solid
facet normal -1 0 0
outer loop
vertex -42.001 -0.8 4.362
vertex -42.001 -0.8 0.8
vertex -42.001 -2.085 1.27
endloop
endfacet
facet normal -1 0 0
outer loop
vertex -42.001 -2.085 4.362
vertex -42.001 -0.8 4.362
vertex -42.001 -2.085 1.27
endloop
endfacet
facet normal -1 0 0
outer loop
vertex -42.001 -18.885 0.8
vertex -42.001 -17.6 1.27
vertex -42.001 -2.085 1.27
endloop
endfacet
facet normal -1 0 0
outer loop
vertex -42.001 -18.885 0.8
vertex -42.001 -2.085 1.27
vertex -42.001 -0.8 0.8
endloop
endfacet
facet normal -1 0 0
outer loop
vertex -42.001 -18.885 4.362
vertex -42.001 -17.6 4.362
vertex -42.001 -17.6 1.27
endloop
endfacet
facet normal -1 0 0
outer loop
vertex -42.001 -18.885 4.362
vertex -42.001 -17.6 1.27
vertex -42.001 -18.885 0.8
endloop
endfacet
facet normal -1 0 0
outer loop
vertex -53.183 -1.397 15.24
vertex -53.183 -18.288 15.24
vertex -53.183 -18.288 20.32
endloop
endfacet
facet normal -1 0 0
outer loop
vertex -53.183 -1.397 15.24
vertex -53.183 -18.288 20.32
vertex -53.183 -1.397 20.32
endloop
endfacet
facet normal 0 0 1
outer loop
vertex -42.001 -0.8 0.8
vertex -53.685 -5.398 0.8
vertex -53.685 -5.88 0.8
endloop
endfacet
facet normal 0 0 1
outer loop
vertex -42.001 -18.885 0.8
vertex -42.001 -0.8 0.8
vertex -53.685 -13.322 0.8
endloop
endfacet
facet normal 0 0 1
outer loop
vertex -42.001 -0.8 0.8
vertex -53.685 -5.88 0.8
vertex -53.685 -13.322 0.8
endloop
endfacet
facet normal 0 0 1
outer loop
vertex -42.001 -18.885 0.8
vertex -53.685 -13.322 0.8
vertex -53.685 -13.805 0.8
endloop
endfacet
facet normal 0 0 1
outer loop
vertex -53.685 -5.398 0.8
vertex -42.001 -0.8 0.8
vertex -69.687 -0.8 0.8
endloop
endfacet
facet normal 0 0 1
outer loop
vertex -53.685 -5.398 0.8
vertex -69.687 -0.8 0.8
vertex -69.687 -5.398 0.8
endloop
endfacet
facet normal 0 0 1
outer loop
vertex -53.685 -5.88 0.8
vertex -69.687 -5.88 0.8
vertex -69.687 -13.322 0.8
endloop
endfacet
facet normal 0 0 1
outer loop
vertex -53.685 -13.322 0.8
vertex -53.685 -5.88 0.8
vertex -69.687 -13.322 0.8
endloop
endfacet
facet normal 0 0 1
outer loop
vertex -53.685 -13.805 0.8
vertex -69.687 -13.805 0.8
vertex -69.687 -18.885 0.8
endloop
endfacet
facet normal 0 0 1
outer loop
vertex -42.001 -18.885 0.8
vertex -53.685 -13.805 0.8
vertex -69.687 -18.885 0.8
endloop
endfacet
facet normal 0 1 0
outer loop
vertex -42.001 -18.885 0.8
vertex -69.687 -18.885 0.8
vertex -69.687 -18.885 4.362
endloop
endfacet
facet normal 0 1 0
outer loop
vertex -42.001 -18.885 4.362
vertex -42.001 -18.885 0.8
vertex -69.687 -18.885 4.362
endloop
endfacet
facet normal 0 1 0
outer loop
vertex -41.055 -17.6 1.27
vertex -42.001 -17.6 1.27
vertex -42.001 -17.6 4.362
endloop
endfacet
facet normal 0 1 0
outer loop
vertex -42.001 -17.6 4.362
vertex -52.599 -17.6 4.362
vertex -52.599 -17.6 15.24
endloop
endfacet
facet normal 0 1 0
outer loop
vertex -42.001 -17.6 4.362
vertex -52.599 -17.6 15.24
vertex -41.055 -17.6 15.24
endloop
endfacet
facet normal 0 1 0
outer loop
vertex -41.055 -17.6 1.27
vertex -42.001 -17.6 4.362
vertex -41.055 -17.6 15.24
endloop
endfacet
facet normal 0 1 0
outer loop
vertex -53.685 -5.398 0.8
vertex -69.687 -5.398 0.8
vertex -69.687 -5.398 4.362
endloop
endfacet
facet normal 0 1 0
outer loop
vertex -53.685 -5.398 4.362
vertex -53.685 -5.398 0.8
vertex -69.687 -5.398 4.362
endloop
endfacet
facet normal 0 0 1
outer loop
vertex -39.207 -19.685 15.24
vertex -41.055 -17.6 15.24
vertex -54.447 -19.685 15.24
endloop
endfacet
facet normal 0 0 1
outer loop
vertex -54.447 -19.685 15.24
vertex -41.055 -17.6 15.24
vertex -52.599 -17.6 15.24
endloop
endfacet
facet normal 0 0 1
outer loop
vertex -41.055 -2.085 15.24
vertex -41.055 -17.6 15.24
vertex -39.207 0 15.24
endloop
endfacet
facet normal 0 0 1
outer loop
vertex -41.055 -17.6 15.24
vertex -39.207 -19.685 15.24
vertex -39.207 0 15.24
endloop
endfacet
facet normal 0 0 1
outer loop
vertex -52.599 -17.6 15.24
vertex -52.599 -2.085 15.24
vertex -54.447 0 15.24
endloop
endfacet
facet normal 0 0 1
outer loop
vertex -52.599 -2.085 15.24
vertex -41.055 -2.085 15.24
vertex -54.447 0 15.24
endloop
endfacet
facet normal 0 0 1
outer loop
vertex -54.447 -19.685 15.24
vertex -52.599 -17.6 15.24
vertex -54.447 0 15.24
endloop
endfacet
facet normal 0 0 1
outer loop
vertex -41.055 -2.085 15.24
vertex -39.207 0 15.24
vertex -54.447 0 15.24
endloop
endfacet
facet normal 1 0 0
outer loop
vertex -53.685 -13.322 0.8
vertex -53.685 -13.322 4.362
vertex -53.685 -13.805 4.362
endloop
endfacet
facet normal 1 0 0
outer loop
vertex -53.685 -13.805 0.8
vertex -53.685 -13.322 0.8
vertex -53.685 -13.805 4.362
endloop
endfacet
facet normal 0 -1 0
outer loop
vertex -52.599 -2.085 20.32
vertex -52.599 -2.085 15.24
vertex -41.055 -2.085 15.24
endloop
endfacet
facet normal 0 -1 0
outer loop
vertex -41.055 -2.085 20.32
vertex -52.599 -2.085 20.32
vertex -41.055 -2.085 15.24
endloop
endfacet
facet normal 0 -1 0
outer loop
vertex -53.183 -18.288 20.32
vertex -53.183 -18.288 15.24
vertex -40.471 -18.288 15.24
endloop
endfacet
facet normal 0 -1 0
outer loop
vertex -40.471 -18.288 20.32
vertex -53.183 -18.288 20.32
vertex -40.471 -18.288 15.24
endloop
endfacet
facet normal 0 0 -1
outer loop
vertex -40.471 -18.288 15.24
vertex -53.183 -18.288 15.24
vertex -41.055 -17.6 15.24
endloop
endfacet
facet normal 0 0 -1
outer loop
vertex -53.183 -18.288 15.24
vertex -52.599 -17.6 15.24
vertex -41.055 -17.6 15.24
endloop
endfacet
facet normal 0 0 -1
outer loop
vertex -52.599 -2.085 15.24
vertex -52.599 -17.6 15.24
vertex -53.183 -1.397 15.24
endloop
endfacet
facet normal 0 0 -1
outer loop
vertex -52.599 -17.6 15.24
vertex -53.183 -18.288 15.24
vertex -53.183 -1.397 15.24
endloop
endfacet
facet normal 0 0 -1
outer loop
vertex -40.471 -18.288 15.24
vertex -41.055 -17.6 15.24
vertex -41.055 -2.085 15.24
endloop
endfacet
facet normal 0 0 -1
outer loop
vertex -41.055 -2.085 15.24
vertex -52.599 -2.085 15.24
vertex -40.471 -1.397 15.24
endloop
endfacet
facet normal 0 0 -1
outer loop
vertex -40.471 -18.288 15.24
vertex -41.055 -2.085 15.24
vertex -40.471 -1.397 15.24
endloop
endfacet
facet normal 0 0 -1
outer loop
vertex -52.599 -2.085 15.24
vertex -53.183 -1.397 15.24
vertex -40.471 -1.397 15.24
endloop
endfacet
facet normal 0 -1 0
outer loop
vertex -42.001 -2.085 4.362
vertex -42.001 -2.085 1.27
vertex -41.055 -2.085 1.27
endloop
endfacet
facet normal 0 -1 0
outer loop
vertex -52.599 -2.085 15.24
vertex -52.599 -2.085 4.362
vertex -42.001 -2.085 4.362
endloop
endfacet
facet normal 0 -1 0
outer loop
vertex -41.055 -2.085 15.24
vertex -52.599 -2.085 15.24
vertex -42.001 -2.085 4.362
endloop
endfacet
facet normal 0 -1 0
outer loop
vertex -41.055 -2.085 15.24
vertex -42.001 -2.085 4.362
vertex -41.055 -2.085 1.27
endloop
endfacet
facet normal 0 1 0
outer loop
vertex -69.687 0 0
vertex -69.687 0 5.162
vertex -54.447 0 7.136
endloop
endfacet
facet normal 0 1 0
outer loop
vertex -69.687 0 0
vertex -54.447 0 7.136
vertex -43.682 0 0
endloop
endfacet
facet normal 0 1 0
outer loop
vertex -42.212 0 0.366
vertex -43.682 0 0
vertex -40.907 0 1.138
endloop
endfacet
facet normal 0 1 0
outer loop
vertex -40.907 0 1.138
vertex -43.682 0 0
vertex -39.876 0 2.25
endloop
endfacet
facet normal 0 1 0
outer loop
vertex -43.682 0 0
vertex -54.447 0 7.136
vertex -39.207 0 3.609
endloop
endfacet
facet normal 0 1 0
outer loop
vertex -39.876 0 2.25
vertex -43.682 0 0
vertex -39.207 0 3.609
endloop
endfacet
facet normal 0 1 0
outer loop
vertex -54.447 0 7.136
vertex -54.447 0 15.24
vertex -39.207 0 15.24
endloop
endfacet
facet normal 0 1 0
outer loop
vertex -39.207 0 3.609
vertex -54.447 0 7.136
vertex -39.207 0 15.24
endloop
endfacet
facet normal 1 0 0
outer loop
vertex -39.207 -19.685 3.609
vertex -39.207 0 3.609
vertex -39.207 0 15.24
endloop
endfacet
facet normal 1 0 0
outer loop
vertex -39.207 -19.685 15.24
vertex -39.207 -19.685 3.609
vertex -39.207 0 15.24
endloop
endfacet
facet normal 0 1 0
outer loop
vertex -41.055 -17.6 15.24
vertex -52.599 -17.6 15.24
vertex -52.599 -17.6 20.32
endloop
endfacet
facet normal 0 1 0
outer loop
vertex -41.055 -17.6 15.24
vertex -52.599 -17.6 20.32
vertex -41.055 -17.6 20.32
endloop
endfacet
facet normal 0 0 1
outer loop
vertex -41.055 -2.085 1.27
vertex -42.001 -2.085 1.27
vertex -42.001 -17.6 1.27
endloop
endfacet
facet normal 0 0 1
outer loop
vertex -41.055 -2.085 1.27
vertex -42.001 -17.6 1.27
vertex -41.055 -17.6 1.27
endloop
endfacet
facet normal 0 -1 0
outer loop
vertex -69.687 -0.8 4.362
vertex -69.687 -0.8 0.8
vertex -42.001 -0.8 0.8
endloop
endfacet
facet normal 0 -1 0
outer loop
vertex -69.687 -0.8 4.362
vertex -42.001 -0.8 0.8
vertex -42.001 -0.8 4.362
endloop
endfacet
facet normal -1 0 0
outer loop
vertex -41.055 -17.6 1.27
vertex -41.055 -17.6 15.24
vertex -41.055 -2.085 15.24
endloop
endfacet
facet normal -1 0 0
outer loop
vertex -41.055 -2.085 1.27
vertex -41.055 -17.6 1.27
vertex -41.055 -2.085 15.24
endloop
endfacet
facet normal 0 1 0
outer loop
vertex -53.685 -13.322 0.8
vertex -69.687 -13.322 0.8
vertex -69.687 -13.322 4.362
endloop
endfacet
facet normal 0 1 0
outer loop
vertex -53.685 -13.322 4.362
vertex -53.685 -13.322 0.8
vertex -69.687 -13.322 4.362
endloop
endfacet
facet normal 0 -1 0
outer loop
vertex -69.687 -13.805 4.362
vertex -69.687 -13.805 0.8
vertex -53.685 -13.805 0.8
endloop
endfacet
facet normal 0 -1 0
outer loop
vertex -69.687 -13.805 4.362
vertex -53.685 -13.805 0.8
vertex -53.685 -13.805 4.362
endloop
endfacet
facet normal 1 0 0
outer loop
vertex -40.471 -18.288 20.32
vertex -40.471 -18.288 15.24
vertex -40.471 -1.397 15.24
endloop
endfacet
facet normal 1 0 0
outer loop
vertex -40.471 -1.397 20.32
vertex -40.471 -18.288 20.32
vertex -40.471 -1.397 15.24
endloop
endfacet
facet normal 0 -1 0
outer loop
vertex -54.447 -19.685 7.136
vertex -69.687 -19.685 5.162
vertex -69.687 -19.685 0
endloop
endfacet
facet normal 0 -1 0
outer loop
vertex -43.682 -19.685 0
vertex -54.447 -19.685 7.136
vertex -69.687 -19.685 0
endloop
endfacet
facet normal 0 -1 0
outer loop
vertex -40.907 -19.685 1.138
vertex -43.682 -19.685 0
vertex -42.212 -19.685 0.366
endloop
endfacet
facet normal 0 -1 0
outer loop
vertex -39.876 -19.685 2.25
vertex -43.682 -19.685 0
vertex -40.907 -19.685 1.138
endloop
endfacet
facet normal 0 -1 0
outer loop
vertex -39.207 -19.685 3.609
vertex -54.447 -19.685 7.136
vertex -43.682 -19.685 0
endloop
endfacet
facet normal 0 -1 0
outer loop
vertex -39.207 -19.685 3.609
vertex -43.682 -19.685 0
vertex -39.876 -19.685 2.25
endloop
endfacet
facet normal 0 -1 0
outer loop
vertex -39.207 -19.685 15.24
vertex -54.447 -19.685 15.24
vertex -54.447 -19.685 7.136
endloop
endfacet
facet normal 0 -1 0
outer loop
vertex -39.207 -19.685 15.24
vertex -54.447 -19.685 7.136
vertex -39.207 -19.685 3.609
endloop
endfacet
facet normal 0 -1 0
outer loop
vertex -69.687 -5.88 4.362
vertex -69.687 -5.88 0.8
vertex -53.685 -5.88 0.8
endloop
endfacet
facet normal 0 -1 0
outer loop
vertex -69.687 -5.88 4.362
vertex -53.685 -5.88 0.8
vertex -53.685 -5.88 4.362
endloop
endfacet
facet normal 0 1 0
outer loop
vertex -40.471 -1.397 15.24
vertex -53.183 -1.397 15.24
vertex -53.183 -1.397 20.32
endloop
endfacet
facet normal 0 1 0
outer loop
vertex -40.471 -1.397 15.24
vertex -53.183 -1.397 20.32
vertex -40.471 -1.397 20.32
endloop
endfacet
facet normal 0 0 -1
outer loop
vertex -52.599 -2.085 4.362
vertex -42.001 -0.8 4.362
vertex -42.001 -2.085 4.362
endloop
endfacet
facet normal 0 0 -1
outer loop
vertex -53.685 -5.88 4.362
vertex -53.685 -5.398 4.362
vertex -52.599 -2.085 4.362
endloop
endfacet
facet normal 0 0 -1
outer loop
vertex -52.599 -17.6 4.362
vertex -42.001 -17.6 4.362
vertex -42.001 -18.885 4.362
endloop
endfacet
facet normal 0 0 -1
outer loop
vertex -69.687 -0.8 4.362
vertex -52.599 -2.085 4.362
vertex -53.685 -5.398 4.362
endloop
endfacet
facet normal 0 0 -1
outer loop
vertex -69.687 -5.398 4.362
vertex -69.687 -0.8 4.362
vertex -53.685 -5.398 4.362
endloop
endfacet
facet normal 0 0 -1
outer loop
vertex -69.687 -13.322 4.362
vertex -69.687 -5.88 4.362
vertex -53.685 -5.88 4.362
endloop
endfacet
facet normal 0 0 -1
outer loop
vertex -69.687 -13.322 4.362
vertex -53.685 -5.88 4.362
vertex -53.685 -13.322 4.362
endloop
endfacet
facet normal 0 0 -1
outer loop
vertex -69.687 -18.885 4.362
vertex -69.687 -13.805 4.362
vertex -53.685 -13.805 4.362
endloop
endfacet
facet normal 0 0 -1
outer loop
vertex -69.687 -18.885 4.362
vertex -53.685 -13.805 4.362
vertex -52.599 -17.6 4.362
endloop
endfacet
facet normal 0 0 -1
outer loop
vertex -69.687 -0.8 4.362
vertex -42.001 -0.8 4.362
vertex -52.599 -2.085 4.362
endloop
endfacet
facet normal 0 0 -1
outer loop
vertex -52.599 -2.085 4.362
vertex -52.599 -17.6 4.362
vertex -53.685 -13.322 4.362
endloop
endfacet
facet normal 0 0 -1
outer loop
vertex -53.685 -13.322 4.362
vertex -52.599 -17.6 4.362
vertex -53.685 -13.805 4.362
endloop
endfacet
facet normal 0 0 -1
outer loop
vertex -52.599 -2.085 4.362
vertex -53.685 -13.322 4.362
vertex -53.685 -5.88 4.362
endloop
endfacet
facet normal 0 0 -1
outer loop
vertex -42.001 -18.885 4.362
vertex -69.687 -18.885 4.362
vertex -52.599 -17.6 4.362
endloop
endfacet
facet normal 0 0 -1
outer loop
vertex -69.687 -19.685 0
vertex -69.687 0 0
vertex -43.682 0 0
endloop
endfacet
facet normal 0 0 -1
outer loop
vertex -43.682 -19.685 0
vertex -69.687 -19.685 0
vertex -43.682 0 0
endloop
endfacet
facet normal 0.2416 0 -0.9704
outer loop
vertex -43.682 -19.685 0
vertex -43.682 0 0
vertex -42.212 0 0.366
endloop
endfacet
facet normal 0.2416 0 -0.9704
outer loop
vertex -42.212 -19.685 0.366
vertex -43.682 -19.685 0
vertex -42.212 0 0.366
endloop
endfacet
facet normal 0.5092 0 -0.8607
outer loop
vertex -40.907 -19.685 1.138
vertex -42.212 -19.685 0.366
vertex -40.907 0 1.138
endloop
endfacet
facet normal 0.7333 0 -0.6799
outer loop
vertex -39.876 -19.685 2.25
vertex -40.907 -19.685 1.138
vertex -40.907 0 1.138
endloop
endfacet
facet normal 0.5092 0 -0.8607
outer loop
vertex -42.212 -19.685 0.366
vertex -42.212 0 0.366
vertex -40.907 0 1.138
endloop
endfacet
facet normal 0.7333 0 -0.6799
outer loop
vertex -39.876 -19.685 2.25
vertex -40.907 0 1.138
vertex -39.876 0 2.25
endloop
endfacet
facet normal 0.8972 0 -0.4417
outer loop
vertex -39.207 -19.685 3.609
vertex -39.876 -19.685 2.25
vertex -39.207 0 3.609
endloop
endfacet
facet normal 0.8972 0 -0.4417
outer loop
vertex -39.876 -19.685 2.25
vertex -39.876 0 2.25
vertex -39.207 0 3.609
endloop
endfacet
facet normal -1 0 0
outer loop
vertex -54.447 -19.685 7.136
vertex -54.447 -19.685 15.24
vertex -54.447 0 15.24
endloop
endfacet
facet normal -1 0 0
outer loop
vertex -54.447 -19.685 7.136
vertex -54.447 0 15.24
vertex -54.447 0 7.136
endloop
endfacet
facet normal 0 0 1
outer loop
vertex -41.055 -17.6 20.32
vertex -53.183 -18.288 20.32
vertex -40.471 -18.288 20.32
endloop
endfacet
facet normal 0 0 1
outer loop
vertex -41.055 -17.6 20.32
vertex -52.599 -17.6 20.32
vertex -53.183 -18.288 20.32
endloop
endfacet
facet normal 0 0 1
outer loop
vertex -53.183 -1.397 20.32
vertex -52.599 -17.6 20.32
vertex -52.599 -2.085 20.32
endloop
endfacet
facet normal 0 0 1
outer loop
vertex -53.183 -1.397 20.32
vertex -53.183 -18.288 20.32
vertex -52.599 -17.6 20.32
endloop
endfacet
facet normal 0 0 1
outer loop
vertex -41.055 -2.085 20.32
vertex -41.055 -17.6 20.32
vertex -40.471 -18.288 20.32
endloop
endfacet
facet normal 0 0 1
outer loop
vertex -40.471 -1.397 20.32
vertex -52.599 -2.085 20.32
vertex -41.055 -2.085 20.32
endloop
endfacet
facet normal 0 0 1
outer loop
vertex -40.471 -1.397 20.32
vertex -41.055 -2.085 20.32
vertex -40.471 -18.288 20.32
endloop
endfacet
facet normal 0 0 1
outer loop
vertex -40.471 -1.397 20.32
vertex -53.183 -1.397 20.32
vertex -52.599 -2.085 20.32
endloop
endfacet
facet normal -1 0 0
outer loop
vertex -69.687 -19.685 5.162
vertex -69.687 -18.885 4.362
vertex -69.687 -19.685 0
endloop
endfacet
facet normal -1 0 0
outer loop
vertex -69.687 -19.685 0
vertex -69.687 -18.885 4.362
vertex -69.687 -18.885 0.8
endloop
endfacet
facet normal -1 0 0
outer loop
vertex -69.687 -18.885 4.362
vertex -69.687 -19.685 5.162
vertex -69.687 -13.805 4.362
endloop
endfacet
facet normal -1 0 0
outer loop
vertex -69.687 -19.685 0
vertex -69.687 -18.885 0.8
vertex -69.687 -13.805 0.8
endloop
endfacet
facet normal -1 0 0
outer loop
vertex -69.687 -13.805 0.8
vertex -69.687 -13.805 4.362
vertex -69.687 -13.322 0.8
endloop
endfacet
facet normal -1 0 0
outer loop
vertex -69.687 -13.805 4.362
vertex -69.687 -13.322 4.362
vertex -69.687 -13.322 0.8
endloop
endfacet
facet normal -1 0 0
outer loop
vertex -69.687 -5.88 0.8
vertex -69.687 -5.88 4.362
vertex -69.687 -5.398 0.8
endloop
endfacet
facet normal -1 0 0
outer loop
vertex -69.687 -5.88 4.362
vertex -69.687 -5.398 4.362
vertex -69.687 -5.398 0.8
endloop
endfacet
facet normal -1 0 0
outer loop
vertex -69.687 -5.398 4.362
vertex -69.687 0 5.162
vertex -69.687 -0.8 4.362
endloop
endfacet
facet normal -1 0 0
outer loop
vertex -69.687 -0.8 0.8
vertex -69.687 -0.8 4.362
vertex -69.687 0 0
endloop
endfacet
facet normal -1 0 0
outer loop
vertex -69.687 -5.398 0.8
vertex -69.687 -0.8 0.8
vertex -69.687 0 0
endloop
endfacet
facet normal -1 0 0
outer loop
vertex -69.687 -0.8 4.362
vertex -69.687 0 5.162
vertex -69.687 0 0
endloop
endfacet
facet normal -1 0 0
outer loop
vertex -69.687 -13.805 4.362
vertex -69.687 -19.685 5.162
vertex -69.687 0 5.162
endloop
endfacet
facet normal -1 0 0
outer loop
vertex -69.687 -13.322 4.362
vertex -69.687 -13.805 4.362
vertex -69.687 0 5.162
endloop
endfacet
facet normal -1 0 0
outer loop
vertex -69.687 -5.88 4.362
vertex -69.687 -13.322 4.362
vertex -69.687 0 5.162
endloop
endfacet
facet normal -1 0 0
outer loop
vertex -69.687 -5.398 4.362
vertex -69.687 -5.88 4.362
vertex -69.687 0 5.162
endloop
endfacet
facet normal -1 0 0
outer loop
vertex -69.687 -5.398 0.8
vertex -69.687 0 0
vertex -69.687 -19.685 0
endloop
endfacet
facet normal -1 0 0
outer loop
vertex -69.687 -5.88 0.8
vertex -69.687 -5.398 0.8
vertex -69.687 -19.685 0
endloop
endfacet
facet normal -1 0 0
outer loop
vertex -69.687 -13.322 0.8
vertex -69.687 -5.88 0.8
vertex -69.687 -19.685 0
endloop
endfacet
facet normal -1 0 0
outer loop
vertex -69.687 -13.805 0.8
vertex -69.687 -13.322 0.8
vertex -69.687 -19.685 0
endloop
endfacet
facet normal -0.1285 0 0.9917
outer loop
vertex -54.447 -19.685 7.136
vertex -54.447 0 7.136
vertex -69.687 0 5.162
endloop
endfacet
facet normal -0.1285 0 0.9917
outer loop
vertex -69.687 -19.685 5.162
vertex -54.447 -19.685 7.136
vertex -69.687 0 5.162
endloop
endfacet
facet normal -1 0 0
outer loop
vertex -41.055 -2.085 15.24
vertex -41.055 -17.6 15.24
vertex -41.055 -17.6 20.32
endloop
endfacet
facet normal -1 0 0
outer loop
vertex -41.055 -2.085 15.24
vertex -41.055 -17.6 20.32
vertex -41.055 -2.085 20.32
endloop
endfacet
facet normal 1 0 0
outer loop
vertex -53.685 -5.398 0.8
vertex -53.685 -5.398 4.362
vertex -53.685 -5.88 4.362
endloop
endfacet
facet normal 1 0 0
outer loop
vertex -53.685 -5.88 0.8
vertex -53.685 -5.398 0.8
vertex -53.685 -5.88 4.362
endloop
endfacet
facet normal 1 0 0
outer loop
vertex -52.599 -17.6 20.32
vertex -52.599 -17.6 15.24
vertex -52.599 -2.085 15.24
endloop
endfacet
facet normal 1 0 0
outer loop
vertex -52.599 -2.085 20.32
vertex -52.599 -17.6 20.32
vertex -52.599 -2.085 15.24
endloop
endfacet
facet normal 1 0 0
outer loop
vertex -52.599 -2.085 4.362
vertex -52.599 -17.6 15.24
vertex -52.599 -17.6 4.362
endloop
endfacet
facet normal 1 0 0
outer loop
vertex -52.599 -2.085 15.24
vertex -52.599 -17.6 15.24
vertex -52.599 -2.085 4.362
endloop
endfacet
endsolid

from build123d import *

# Parameters (mm, degrees)
F1_DEPTH = 19.685
F2_W     = 11.544244
F2_H     = 15.515834
F3_DEPTH = 13.97
F4_W     = 18.0848
F4_H     = 3.562237
F5_DEPTH = 27.686
F6_W     = 12.711847
F6_H     = 16.891
F6_W_2   = 11.544244
F6_H_2   = 15.515834
F7_DEPTH = 5.08
F8_W     = 0.4826
F8_H     = 3.562237
F9_DEPTH = 16.002


with BuildPart() as f1:
    # F0 (on Front) → F1 (new body)
    with BuildSketch(Plane.XZ):
        with BuildLine():
            Line((-69.68681, 5.162437), (-69.68681, 0))
            Line((-69.68681, 0), (-43.682389, 0))
            ThreePointArc((-43.682389, 0), (-40.906666, 1.137661), (-39.20681, 3.609381))
            Line((-39.20681, 3.609381), (-39.20681, 15.24))
            Line((-39.20681, 15.24), (-54.44681, 15.24))
            Line((-54.44681, 15.24), (-54.44681, 7.136006))
            Line((-54.44681, 7.136006), (-69.68681, 5.162437))
        make_face()
    extrude(amount=F1_DEPTH)

    # F2 (on face) → F3 (cut)
    with BuildSketch(Plane.XY.offset(15.24)):
        with Locations((-46.82681, -9.8425)):
            Rectangle(F2_W, F2_H)
    extrude(amount=-F3_DEPTH, mode=Mode.SUBTRACT)

    # F4 (on face) → F5 (cut)
    with BuildSketch(Plane(origin=(-69.68681, 0, 0), x_dir=(0, -1, 0), z_dir=(-1, 0, 0))):
        with Locations((9.8425, 2.581218)):
            Rectangle(F4_W, F4_H)
    extrude(amount=-F5_DEPTH, mode=Mode.SUBTRACT)

    # F8 (on face) → F9 (join)
    with BuildSketch(Plane(origin=(-69.68681, 0, 0), x_dir=(0, -1, 0), z_dir=(-1, 0, 0))):
        with Locations((5.6388, 2.581218)):
            Rectangle(F8_W, F8_H)
        with Locations((13.5636, 2.581218)):
            Rectangle(F8_W, F8_H)
    extrude(amount=-F9_DEPTH)


with BuildPart() as f7:
    # F6 (on face) → F7 (new body)
    with BuildSketch(Plane.XY.offset(15.24)):
        with Locations((-46.82681, -9.8425)):
            Rectangle(F6_W, F6_H)
        with Locations((-46.82681, -9.8425)):
            Rectangle(F6_W_2, F6_H_2, mode=Mode.SUBTRACT)
    extrude(amount=F7_DEPTH)


solid = Compound([f1.part, f7.part])
